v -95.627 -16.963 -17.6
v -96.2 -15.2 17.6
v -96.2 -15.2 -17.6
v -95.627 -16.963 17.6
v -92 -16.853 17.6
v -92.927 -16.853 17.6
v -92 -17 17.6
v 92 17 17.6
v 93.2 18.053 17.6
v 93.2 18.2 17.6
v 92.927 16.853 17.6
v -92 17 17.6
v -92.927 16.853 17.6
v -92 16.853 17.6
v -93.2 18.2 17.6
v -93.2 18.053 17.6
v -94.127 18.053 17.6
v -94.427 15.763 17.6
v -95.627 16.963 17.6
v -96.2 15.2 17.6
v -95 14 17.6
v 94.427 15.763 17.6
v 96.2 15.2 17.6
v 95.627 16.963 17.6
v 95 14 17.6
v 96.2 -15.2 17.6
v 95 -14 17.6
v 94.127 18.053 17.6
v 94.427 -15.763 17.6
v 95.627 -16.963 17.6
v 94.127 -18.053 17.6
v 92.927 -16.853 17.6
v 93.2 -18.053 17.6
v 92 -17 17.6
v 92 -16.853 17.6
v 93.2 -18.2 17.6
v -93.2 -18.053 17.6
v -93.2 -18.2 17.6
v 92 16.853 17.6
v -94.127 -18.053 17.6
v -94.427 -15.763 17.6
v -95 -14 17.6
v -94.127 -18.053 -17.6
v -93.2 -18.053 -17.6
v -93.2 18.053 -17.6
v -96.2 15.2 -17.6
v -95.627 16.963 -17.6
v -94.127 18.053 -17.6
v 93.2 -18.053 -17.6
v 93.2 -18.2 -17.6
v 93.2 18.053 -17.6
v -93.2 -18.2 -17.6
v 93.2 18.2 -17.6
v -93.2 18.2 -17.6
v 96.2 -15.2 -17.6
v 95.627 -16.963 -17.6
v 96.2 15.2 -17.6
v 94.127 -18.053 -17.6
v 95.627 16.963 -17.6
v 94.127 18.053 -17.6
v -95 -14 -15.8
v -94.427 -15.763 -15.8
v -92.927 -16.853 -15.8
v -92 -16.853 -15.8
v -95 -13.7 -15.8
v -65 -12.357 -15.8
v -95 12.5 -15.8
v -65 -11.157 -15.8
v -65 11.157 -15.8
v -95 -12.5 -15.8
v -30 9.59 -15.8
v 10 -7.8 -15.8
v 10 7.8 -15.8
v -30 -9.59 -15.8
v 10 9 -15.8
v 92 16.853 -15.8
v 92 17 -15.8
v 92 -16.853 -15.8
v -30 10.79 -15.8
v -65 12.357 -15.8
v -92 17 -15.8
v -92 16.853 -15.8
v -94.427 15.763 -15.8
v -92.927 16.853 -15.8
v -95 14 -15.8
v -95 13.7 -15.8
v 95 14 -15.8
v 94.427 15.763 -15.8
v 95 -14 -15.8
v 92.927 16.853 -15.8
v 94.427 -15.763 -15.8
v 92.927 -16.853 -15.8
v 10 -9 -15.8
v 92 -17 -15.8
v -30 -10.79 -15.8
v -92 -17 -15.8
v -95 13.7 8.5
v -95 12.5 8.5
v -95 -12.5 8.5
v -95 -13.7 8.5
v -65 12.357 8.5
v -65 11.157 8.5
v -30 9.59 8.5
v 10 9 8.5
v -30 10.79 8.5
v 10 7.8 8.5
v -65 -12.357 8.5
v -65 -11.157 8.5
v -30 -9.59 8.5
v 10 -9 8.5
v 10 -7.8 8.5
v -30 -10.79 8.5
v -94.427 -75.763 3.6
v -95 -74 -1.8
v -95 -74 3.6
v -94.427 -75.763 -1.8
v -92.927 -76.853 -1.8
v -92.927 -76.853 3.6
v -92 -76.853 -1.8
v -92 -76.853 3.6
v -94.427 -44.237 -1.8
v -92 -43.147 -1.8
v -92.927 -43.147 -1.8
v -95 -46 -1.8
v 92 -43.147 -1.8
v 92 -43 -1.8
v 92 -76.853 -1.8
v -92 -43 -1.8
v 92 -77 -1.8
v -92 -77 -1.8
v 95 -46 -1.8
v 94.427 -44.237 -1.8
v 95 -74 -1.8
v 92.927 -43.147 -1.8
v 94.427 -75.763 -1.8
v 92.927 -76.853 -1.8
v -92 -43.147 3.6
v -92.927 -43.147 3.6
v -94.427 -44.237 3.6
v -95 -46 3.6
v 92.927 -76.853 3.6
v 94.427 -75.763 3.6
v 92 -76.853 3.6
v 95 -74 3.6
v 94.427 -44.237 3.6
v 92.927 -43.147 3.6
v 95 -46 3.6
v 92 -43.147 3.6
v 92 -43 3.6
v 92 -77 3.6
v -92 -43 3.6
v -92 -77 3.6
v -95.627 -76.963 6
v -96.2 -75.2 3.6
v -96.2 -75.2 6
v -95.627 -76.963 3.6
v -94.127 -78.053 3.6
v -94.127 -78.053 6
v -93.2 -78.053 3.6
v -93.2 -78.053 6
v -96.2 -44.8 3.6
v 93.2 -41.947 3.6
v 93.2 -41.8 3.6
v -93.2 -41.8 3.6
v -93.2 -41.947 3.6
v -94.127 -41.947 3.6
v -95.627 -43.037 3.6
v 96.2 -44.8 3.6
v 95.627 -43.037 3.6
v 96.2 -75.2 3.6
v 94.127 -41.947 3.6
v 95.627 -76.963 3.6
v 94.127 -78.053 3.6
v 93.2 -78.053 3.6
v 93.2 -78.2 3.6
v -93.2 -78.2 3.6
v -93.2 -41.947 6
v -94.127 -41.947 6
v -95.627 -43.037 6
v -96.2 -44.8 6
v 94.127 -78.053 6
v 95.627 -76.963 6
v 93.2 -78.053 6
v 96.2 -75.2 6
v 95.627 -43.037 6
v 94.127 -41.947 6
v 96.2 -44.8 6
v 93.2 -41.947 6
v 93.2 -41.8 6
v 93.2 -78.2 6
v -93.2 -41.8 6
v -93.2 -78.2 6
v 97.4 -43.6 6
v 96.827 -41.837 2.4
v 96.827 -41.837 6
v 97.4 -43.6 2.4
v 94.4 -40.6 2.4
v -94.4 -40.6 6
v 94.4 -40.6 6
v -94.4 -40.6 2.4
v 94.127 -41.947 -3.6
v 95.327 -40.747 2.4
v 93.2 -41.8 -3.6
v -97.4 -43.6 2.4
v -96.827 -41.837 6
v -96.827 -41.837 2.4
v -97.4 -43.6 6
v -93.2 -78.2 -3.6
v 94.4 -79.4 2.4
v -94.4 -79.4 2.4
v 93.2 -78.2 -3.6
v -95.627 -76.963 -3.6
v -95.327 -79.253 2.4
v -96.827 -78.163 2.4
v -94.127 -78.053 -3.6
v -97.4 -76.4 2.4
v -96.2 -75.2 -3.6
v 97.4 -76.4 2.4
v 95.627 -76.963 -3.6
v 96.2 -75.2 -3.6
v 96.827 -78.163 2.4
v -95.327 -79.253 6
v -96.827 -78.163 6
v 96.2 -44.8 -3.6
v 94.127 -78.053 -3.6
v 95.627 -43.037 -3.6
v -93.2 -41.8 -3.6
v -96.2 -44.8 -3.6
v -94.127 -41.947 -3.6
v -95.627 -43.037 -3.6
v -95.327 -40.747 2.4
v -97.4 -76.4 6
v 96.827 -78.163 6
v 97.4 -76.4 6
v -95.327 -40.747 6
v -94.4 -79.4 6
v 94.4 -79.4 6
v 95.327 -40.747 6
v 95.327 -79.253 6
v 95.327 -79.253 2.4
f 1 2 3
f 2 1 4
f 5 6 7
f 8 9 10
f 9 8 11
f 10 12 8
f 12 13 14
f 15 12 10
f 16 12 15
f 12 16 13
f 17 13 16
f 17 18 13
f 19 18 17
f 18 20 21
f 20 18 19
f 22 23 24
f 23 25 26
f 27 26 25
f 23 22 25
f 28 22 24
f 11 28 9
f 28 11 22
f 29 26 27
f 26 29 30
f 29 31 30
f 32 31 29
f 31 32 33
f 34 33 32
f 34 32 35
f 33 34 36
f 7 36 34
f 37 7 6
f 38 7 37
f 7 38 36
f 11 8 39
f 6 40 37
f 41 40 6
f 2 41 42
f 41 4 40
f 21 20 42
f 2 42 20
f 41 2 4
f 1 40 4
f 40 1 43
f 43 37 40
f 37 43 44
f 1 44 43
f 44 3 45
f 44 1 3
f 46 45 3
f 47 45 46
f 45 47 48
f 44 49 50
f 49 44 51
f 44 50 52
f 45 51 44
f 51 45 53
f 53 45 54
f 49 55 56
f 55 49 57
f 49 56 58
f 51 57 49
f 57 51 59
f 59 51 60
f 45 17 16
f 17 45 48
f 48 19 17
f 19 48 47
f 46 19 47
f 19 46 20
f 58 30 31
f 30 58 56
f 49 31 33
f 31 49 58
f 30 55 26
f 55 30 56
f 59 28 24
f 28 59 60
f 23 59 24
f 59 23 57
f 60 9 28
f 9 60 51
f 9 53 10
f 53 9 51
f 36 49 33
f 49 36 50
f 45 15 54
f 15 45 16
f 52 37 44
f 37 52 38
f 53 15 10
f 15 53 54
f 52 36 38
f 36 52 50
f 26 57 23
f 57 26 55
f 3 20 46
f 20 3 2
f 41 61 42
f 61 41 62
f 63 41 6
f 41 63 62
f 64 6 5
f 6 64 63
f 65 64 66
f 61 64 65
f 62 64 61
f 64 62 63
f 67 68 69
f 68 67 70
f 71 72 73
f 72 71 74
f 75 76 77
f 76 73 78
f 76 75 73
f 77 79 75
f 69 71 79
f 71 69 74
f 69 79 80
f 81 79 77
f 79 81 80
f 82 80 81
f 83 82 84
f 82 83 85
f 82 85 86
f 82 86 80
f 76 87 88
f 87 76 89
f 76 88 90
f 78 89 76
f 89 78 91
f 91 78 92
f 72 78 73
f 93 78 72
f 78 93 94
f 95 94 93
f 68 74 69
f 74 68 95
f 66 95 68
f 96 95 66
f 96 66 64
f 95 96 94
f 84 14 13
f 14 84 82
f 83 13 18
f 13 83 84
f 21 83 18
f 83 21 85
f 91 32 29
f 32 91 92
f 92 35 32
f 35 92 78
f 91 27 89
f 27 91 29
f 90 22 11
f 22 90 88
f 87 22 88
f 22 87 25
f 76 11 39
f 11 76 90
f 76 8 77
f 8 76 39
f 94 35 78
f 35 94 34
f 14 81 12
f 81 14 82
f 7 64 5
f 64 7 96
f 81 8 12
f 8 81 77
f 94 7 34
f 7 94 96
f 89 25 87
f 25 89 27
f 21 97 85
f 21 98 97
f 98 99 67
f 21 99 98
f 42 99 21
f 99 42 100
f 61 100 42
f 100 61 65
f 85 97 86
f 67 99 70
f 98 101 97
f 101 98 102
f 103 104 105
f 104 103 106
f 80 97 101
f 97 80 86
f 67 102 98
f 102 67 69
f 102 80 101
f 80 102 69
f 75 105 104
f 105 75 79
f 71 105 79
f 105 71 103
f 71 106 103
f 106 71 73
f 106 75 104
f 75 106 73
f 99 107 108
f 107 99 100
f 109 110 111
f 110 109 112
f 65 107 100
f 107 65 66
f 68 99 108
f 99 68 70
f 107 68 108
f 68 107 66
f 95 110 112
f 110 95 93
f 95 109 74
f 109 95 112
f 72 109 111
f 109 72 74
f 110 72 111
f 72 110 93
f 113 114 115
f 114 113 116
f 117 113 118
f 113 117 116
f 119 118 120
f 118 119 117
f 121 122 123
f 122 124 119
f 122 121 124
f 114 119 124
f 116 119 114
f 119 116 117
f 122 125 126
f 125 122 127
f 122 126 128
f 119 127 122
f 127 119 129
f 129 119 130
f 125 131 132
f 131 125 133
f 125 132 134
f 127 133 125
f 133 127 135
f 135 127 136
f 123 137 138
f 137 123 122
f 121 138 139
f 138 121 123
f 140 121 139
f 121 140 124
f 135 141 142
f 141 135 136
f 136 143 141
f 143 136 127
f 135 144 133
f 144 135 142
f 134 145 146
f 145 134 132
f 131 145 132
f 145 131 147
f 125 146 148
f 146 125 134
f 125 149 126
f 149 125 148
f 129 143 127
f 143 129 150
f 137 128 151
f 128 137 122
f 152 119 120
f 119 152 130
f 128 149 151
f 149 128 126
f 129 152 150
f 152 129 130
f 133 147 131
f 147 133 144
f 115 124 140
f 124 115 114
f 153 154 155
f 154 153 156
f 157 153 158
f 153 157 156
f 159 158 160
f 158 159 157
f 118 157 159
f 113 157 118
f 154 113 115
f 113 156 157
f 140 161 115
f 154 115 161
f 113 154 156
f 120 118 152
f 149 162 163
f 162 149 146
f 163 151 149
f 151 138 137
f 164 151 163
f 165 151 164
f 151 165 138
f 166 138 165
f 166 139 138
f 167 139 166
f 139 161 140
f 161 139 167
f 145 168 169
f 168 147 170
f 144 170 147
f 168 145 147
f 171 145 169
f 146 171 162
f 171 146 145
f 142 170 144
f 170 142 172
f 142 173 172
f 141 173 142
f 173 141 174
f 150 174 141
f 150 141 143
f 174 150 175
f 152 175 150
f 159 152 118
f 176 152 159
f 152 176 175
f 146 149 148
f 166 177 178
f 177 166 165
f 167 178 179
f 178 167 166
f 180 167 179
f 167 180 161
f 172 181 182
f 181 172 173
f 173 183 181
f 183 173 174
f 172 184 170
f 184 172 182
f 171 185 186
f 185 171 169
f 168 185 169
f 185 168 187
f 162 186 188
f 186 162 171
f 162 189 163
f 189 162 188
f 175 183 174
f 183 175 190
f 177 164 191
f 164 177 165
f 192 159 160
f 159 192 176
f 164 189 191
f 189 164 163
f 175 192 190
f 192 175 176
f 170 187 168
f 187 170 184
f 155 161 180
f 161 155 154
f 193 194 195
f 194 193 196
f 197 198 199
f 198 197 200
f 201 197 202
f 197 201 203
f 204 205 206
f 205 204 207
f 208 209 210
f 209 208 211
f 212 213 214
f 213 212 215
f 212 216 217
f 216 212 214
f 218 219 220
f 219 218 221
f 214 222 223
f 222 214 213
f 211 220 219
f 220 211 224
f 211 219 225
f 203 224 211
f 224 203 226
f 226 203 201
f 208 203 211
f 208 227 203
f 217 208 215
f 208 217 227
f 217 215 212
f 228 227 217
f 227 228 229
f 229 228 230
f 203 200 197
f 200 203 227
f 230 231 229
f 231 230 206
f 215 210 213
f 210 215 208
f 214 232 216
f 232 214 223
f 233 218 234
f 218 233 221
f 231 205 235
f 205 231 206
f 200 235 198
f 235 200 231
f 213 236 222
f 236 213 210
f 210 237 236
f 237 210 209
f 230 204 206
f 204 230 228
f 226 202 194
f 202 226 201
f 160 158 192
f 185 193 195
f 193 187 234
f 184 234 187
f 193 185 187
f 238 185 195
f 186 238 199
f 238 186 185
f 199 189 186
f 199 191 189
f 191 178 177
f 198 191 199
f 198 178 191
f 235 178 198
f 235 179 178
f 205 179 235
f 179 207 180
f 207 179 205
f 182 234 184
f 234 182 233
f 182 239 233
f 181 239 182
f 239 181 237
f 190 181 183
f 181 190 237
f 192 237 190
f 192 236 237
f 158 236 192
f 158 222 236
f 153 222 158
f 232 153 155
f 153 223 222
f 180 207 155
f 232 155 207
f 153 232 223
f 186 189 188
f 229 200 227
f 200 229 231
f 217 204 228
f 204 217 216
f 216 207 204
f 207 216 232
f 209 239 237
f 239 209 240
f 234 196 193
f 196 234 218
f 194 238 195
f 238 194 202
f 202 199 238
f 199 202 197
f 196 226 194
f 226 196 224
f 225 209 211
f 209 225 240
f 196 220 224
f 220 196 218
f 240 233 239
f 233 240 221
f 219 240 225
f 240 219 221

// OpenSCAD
include <MCAD/boxes.scad>

box_bottom_internal_dimensions=[
    190,
    34,
    34
];

box_top_internal_height=6;

min_thickness=1.2;
2min_thicnkess=min_thickness*2;
corner_radius=3;

lip_height=2.4;

clearance_tight=0.2;
2clearance_tight=2*clearance_tight;

// calculated
box_bottom_external_dimension=[
    box_bottom_internal_dimensions.x + 2min_thicnkess,
    box_bottom_internal_dimensions.y + 2min_thicnkess,
    box_bottom_internal_dimensions.z + min_thickness
];

box_top_internal_dimension=[
    box_bottom_internal_dimensions.x,
    box_bottom_internal_dimensions.y,
    box_top_internal_height
];

box_top_external_dimension=[
    box_top_internal_dimension.x + 2min_thicnkess,
    box_top_internal_dimension.y + 2min_thicnkess,
    box_top_internal_height + min_thickness
];

lip_internal_dimension=[
    box_top_external_dimension.x,
    box_top_external_dimension.y,
    lip_height
];

lip_external_dimension=[
    lip_internal_dimension.x + 2min_thicnkess,
    lip_internal_dimension.y + 2min_thicnkess,
    lip_internal_dimension.z + min_thickness
];

// bottom
difference() {
    roundedBox(box_bottom_external_dimension, corner_radius, true);
    translate([0,0,min_thickness]) roundedBox(box_bottom_internal_dimensions, corner_radius, true);
}

// a V to hold the lame tool
lame_end_y=25;
lame_mid_y=15.6;
lame_mid_x=105;
// a V channel 105mm long with a gap at 30 - 65

v_xy_points=[
    [0, lame_end_y/2],
    [105, lame_mid_y/2],
    [105, lame_mid_y/2 + min_thickness],
    [0, lame_end_y/2 + min_thickness],
];

module _half_V() {
    linear_extrude(box_bottom_internal_dimensions.z * .75) {
        difference() {
            polygon(points=v_xy_points);
            translate([30, 0, 0]) square(size=[35, lame_mid_y], center=false);
        };
    };
}

module V() {
    _half_V();
    mirror([0, 1, 0]) _half_V();
}

translate([
    -box_bottom_internal_dimensions.x / 2,
    0,
    -box_bottom_internal_dimensions.z / 2
]) V();

translate([0, -60, 0]) difference() {
    hull() {
        roundedBox(box_top_external_dimension, corner_radius, true);
        translate([
            0,
            0,
            (box_top_external_dimension.z / 2) + min_thickness / 2
        ]) roundedBox(lip_external_dimension, corner_radius, true);
    }
    translate([0,0,min_thickness]) roundedBox(box_top_internal_dimension, corner_radius, true);
    translate([
        0,
        0,
        (box_top_external_dimension.z / 2) + (min_thickness)
    ]) roundedBox(lip_internal_dimension, corner_radius, true);
}
